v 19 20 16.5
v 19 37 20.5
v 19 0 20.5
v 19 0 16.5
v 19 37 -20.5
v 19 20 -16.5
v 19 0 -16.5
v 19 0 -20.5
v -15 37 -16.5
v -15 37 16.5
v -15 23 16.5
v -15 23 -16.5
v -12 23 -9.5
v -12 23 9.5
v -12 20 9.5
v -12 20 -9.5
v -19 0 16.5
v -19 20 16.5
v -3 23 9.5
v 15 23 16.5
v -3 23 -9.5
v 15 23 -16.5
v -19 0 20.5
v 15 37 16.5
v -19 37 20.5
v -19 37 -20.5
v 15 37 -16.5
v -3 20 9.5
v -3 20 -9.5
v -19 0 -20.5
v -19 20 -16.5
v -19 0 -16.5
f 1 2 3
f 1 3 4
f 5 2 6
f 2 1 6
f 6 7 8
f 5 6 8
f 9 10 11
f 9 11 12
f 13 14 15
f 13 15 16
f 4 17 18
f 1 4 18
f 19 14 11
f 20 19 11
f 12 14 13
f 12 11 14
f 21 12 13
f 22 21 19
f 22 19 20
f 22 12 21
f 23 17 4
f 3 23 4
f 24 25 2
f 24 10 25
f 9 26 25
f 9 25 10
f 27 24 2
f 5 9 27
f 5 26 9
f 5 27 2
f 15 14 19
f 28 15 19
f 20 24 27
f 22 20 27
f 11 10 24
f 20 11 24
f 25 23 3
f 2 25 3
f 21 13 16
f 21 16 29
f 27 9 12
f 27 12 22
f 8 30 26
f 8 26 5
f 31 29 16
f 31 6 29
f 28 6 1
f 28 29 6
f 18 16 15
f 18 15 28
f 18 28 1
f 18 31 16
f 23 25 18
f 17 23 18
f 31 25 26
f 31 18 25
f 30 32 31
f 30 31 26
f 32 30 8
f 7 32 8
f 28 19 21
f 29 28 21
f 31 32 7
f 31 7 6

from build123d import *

# Parameters (mm, degrees)
SKETCH1_W           = 38
SKETCH1_H           = 41
BOSS_EXTRUDE1_DEPTH = 37
SKETCH2_W           = 30
SKETCH2_H           = 33
CUT_EXTRUDE1_DEPTH  = 14
SKETCH3_W           = 33
SKETCH3_H           = 20
CUT_EXTRUDE2_DEPTH  = 57.861674263
SKETCH4_W           = 9
SKETCH4_H           = 19
CUT_EXTRUDE3_DEPTH  = 37.197375595


with BuildPart() as part:
    # Sketch1 → Boss-Extrude1 (new body)
    with BuildSketch(Plane(origin=(0, 0, 0), x_dir=(1, 0, 0), z_dir=(0, 1, 0))):
        Rectangle(SKETCH1_W, SKETCH1_H)
    extrude(amount=BOSS_EXTRUDE1_DEPTH)

    # Sketch2 → Cut-Extrude1 (cut)
    with BuildSketch(Plane(origin=(0, 37, 0), x_dir=(1, 0, 0), z_dir=(0, 1, 0))):
        Rectangle(SKETCH2_W, SKETCH2_H)
    extrude(amount=-CUT_EXTRUDE1_DEPTH, mode=Mode.SUBTRACT)

    # Sketch3 → Cut-Extrude2 (cut, through all)
    with BuildSketch(Plane.ZY.offset(19)):
        with Locations((0, 10)):
            Rectangle(SKETCH3_W, SKETCH3_H)
    extrude(amount=-CUT_EXTRUDE2_DEPTH, mode=Mode.SUBTRACT)

    # Sketch4 → Cut-Extrude3 (cut, through all)
    with BuildSketch(Plane(origin=(0, 23, 0), x_dir=(1, 0, 0), z_dir=(0, 1, 0))):
        with Locations((-7.5, 0)):
            Rectangle(SKETCH4_W, SKETCH4_H)
    extrude(amount=-CUT_EXTRUDE3_DEPTH, mode=Mode.SUBTRACT)


solid = part.part
